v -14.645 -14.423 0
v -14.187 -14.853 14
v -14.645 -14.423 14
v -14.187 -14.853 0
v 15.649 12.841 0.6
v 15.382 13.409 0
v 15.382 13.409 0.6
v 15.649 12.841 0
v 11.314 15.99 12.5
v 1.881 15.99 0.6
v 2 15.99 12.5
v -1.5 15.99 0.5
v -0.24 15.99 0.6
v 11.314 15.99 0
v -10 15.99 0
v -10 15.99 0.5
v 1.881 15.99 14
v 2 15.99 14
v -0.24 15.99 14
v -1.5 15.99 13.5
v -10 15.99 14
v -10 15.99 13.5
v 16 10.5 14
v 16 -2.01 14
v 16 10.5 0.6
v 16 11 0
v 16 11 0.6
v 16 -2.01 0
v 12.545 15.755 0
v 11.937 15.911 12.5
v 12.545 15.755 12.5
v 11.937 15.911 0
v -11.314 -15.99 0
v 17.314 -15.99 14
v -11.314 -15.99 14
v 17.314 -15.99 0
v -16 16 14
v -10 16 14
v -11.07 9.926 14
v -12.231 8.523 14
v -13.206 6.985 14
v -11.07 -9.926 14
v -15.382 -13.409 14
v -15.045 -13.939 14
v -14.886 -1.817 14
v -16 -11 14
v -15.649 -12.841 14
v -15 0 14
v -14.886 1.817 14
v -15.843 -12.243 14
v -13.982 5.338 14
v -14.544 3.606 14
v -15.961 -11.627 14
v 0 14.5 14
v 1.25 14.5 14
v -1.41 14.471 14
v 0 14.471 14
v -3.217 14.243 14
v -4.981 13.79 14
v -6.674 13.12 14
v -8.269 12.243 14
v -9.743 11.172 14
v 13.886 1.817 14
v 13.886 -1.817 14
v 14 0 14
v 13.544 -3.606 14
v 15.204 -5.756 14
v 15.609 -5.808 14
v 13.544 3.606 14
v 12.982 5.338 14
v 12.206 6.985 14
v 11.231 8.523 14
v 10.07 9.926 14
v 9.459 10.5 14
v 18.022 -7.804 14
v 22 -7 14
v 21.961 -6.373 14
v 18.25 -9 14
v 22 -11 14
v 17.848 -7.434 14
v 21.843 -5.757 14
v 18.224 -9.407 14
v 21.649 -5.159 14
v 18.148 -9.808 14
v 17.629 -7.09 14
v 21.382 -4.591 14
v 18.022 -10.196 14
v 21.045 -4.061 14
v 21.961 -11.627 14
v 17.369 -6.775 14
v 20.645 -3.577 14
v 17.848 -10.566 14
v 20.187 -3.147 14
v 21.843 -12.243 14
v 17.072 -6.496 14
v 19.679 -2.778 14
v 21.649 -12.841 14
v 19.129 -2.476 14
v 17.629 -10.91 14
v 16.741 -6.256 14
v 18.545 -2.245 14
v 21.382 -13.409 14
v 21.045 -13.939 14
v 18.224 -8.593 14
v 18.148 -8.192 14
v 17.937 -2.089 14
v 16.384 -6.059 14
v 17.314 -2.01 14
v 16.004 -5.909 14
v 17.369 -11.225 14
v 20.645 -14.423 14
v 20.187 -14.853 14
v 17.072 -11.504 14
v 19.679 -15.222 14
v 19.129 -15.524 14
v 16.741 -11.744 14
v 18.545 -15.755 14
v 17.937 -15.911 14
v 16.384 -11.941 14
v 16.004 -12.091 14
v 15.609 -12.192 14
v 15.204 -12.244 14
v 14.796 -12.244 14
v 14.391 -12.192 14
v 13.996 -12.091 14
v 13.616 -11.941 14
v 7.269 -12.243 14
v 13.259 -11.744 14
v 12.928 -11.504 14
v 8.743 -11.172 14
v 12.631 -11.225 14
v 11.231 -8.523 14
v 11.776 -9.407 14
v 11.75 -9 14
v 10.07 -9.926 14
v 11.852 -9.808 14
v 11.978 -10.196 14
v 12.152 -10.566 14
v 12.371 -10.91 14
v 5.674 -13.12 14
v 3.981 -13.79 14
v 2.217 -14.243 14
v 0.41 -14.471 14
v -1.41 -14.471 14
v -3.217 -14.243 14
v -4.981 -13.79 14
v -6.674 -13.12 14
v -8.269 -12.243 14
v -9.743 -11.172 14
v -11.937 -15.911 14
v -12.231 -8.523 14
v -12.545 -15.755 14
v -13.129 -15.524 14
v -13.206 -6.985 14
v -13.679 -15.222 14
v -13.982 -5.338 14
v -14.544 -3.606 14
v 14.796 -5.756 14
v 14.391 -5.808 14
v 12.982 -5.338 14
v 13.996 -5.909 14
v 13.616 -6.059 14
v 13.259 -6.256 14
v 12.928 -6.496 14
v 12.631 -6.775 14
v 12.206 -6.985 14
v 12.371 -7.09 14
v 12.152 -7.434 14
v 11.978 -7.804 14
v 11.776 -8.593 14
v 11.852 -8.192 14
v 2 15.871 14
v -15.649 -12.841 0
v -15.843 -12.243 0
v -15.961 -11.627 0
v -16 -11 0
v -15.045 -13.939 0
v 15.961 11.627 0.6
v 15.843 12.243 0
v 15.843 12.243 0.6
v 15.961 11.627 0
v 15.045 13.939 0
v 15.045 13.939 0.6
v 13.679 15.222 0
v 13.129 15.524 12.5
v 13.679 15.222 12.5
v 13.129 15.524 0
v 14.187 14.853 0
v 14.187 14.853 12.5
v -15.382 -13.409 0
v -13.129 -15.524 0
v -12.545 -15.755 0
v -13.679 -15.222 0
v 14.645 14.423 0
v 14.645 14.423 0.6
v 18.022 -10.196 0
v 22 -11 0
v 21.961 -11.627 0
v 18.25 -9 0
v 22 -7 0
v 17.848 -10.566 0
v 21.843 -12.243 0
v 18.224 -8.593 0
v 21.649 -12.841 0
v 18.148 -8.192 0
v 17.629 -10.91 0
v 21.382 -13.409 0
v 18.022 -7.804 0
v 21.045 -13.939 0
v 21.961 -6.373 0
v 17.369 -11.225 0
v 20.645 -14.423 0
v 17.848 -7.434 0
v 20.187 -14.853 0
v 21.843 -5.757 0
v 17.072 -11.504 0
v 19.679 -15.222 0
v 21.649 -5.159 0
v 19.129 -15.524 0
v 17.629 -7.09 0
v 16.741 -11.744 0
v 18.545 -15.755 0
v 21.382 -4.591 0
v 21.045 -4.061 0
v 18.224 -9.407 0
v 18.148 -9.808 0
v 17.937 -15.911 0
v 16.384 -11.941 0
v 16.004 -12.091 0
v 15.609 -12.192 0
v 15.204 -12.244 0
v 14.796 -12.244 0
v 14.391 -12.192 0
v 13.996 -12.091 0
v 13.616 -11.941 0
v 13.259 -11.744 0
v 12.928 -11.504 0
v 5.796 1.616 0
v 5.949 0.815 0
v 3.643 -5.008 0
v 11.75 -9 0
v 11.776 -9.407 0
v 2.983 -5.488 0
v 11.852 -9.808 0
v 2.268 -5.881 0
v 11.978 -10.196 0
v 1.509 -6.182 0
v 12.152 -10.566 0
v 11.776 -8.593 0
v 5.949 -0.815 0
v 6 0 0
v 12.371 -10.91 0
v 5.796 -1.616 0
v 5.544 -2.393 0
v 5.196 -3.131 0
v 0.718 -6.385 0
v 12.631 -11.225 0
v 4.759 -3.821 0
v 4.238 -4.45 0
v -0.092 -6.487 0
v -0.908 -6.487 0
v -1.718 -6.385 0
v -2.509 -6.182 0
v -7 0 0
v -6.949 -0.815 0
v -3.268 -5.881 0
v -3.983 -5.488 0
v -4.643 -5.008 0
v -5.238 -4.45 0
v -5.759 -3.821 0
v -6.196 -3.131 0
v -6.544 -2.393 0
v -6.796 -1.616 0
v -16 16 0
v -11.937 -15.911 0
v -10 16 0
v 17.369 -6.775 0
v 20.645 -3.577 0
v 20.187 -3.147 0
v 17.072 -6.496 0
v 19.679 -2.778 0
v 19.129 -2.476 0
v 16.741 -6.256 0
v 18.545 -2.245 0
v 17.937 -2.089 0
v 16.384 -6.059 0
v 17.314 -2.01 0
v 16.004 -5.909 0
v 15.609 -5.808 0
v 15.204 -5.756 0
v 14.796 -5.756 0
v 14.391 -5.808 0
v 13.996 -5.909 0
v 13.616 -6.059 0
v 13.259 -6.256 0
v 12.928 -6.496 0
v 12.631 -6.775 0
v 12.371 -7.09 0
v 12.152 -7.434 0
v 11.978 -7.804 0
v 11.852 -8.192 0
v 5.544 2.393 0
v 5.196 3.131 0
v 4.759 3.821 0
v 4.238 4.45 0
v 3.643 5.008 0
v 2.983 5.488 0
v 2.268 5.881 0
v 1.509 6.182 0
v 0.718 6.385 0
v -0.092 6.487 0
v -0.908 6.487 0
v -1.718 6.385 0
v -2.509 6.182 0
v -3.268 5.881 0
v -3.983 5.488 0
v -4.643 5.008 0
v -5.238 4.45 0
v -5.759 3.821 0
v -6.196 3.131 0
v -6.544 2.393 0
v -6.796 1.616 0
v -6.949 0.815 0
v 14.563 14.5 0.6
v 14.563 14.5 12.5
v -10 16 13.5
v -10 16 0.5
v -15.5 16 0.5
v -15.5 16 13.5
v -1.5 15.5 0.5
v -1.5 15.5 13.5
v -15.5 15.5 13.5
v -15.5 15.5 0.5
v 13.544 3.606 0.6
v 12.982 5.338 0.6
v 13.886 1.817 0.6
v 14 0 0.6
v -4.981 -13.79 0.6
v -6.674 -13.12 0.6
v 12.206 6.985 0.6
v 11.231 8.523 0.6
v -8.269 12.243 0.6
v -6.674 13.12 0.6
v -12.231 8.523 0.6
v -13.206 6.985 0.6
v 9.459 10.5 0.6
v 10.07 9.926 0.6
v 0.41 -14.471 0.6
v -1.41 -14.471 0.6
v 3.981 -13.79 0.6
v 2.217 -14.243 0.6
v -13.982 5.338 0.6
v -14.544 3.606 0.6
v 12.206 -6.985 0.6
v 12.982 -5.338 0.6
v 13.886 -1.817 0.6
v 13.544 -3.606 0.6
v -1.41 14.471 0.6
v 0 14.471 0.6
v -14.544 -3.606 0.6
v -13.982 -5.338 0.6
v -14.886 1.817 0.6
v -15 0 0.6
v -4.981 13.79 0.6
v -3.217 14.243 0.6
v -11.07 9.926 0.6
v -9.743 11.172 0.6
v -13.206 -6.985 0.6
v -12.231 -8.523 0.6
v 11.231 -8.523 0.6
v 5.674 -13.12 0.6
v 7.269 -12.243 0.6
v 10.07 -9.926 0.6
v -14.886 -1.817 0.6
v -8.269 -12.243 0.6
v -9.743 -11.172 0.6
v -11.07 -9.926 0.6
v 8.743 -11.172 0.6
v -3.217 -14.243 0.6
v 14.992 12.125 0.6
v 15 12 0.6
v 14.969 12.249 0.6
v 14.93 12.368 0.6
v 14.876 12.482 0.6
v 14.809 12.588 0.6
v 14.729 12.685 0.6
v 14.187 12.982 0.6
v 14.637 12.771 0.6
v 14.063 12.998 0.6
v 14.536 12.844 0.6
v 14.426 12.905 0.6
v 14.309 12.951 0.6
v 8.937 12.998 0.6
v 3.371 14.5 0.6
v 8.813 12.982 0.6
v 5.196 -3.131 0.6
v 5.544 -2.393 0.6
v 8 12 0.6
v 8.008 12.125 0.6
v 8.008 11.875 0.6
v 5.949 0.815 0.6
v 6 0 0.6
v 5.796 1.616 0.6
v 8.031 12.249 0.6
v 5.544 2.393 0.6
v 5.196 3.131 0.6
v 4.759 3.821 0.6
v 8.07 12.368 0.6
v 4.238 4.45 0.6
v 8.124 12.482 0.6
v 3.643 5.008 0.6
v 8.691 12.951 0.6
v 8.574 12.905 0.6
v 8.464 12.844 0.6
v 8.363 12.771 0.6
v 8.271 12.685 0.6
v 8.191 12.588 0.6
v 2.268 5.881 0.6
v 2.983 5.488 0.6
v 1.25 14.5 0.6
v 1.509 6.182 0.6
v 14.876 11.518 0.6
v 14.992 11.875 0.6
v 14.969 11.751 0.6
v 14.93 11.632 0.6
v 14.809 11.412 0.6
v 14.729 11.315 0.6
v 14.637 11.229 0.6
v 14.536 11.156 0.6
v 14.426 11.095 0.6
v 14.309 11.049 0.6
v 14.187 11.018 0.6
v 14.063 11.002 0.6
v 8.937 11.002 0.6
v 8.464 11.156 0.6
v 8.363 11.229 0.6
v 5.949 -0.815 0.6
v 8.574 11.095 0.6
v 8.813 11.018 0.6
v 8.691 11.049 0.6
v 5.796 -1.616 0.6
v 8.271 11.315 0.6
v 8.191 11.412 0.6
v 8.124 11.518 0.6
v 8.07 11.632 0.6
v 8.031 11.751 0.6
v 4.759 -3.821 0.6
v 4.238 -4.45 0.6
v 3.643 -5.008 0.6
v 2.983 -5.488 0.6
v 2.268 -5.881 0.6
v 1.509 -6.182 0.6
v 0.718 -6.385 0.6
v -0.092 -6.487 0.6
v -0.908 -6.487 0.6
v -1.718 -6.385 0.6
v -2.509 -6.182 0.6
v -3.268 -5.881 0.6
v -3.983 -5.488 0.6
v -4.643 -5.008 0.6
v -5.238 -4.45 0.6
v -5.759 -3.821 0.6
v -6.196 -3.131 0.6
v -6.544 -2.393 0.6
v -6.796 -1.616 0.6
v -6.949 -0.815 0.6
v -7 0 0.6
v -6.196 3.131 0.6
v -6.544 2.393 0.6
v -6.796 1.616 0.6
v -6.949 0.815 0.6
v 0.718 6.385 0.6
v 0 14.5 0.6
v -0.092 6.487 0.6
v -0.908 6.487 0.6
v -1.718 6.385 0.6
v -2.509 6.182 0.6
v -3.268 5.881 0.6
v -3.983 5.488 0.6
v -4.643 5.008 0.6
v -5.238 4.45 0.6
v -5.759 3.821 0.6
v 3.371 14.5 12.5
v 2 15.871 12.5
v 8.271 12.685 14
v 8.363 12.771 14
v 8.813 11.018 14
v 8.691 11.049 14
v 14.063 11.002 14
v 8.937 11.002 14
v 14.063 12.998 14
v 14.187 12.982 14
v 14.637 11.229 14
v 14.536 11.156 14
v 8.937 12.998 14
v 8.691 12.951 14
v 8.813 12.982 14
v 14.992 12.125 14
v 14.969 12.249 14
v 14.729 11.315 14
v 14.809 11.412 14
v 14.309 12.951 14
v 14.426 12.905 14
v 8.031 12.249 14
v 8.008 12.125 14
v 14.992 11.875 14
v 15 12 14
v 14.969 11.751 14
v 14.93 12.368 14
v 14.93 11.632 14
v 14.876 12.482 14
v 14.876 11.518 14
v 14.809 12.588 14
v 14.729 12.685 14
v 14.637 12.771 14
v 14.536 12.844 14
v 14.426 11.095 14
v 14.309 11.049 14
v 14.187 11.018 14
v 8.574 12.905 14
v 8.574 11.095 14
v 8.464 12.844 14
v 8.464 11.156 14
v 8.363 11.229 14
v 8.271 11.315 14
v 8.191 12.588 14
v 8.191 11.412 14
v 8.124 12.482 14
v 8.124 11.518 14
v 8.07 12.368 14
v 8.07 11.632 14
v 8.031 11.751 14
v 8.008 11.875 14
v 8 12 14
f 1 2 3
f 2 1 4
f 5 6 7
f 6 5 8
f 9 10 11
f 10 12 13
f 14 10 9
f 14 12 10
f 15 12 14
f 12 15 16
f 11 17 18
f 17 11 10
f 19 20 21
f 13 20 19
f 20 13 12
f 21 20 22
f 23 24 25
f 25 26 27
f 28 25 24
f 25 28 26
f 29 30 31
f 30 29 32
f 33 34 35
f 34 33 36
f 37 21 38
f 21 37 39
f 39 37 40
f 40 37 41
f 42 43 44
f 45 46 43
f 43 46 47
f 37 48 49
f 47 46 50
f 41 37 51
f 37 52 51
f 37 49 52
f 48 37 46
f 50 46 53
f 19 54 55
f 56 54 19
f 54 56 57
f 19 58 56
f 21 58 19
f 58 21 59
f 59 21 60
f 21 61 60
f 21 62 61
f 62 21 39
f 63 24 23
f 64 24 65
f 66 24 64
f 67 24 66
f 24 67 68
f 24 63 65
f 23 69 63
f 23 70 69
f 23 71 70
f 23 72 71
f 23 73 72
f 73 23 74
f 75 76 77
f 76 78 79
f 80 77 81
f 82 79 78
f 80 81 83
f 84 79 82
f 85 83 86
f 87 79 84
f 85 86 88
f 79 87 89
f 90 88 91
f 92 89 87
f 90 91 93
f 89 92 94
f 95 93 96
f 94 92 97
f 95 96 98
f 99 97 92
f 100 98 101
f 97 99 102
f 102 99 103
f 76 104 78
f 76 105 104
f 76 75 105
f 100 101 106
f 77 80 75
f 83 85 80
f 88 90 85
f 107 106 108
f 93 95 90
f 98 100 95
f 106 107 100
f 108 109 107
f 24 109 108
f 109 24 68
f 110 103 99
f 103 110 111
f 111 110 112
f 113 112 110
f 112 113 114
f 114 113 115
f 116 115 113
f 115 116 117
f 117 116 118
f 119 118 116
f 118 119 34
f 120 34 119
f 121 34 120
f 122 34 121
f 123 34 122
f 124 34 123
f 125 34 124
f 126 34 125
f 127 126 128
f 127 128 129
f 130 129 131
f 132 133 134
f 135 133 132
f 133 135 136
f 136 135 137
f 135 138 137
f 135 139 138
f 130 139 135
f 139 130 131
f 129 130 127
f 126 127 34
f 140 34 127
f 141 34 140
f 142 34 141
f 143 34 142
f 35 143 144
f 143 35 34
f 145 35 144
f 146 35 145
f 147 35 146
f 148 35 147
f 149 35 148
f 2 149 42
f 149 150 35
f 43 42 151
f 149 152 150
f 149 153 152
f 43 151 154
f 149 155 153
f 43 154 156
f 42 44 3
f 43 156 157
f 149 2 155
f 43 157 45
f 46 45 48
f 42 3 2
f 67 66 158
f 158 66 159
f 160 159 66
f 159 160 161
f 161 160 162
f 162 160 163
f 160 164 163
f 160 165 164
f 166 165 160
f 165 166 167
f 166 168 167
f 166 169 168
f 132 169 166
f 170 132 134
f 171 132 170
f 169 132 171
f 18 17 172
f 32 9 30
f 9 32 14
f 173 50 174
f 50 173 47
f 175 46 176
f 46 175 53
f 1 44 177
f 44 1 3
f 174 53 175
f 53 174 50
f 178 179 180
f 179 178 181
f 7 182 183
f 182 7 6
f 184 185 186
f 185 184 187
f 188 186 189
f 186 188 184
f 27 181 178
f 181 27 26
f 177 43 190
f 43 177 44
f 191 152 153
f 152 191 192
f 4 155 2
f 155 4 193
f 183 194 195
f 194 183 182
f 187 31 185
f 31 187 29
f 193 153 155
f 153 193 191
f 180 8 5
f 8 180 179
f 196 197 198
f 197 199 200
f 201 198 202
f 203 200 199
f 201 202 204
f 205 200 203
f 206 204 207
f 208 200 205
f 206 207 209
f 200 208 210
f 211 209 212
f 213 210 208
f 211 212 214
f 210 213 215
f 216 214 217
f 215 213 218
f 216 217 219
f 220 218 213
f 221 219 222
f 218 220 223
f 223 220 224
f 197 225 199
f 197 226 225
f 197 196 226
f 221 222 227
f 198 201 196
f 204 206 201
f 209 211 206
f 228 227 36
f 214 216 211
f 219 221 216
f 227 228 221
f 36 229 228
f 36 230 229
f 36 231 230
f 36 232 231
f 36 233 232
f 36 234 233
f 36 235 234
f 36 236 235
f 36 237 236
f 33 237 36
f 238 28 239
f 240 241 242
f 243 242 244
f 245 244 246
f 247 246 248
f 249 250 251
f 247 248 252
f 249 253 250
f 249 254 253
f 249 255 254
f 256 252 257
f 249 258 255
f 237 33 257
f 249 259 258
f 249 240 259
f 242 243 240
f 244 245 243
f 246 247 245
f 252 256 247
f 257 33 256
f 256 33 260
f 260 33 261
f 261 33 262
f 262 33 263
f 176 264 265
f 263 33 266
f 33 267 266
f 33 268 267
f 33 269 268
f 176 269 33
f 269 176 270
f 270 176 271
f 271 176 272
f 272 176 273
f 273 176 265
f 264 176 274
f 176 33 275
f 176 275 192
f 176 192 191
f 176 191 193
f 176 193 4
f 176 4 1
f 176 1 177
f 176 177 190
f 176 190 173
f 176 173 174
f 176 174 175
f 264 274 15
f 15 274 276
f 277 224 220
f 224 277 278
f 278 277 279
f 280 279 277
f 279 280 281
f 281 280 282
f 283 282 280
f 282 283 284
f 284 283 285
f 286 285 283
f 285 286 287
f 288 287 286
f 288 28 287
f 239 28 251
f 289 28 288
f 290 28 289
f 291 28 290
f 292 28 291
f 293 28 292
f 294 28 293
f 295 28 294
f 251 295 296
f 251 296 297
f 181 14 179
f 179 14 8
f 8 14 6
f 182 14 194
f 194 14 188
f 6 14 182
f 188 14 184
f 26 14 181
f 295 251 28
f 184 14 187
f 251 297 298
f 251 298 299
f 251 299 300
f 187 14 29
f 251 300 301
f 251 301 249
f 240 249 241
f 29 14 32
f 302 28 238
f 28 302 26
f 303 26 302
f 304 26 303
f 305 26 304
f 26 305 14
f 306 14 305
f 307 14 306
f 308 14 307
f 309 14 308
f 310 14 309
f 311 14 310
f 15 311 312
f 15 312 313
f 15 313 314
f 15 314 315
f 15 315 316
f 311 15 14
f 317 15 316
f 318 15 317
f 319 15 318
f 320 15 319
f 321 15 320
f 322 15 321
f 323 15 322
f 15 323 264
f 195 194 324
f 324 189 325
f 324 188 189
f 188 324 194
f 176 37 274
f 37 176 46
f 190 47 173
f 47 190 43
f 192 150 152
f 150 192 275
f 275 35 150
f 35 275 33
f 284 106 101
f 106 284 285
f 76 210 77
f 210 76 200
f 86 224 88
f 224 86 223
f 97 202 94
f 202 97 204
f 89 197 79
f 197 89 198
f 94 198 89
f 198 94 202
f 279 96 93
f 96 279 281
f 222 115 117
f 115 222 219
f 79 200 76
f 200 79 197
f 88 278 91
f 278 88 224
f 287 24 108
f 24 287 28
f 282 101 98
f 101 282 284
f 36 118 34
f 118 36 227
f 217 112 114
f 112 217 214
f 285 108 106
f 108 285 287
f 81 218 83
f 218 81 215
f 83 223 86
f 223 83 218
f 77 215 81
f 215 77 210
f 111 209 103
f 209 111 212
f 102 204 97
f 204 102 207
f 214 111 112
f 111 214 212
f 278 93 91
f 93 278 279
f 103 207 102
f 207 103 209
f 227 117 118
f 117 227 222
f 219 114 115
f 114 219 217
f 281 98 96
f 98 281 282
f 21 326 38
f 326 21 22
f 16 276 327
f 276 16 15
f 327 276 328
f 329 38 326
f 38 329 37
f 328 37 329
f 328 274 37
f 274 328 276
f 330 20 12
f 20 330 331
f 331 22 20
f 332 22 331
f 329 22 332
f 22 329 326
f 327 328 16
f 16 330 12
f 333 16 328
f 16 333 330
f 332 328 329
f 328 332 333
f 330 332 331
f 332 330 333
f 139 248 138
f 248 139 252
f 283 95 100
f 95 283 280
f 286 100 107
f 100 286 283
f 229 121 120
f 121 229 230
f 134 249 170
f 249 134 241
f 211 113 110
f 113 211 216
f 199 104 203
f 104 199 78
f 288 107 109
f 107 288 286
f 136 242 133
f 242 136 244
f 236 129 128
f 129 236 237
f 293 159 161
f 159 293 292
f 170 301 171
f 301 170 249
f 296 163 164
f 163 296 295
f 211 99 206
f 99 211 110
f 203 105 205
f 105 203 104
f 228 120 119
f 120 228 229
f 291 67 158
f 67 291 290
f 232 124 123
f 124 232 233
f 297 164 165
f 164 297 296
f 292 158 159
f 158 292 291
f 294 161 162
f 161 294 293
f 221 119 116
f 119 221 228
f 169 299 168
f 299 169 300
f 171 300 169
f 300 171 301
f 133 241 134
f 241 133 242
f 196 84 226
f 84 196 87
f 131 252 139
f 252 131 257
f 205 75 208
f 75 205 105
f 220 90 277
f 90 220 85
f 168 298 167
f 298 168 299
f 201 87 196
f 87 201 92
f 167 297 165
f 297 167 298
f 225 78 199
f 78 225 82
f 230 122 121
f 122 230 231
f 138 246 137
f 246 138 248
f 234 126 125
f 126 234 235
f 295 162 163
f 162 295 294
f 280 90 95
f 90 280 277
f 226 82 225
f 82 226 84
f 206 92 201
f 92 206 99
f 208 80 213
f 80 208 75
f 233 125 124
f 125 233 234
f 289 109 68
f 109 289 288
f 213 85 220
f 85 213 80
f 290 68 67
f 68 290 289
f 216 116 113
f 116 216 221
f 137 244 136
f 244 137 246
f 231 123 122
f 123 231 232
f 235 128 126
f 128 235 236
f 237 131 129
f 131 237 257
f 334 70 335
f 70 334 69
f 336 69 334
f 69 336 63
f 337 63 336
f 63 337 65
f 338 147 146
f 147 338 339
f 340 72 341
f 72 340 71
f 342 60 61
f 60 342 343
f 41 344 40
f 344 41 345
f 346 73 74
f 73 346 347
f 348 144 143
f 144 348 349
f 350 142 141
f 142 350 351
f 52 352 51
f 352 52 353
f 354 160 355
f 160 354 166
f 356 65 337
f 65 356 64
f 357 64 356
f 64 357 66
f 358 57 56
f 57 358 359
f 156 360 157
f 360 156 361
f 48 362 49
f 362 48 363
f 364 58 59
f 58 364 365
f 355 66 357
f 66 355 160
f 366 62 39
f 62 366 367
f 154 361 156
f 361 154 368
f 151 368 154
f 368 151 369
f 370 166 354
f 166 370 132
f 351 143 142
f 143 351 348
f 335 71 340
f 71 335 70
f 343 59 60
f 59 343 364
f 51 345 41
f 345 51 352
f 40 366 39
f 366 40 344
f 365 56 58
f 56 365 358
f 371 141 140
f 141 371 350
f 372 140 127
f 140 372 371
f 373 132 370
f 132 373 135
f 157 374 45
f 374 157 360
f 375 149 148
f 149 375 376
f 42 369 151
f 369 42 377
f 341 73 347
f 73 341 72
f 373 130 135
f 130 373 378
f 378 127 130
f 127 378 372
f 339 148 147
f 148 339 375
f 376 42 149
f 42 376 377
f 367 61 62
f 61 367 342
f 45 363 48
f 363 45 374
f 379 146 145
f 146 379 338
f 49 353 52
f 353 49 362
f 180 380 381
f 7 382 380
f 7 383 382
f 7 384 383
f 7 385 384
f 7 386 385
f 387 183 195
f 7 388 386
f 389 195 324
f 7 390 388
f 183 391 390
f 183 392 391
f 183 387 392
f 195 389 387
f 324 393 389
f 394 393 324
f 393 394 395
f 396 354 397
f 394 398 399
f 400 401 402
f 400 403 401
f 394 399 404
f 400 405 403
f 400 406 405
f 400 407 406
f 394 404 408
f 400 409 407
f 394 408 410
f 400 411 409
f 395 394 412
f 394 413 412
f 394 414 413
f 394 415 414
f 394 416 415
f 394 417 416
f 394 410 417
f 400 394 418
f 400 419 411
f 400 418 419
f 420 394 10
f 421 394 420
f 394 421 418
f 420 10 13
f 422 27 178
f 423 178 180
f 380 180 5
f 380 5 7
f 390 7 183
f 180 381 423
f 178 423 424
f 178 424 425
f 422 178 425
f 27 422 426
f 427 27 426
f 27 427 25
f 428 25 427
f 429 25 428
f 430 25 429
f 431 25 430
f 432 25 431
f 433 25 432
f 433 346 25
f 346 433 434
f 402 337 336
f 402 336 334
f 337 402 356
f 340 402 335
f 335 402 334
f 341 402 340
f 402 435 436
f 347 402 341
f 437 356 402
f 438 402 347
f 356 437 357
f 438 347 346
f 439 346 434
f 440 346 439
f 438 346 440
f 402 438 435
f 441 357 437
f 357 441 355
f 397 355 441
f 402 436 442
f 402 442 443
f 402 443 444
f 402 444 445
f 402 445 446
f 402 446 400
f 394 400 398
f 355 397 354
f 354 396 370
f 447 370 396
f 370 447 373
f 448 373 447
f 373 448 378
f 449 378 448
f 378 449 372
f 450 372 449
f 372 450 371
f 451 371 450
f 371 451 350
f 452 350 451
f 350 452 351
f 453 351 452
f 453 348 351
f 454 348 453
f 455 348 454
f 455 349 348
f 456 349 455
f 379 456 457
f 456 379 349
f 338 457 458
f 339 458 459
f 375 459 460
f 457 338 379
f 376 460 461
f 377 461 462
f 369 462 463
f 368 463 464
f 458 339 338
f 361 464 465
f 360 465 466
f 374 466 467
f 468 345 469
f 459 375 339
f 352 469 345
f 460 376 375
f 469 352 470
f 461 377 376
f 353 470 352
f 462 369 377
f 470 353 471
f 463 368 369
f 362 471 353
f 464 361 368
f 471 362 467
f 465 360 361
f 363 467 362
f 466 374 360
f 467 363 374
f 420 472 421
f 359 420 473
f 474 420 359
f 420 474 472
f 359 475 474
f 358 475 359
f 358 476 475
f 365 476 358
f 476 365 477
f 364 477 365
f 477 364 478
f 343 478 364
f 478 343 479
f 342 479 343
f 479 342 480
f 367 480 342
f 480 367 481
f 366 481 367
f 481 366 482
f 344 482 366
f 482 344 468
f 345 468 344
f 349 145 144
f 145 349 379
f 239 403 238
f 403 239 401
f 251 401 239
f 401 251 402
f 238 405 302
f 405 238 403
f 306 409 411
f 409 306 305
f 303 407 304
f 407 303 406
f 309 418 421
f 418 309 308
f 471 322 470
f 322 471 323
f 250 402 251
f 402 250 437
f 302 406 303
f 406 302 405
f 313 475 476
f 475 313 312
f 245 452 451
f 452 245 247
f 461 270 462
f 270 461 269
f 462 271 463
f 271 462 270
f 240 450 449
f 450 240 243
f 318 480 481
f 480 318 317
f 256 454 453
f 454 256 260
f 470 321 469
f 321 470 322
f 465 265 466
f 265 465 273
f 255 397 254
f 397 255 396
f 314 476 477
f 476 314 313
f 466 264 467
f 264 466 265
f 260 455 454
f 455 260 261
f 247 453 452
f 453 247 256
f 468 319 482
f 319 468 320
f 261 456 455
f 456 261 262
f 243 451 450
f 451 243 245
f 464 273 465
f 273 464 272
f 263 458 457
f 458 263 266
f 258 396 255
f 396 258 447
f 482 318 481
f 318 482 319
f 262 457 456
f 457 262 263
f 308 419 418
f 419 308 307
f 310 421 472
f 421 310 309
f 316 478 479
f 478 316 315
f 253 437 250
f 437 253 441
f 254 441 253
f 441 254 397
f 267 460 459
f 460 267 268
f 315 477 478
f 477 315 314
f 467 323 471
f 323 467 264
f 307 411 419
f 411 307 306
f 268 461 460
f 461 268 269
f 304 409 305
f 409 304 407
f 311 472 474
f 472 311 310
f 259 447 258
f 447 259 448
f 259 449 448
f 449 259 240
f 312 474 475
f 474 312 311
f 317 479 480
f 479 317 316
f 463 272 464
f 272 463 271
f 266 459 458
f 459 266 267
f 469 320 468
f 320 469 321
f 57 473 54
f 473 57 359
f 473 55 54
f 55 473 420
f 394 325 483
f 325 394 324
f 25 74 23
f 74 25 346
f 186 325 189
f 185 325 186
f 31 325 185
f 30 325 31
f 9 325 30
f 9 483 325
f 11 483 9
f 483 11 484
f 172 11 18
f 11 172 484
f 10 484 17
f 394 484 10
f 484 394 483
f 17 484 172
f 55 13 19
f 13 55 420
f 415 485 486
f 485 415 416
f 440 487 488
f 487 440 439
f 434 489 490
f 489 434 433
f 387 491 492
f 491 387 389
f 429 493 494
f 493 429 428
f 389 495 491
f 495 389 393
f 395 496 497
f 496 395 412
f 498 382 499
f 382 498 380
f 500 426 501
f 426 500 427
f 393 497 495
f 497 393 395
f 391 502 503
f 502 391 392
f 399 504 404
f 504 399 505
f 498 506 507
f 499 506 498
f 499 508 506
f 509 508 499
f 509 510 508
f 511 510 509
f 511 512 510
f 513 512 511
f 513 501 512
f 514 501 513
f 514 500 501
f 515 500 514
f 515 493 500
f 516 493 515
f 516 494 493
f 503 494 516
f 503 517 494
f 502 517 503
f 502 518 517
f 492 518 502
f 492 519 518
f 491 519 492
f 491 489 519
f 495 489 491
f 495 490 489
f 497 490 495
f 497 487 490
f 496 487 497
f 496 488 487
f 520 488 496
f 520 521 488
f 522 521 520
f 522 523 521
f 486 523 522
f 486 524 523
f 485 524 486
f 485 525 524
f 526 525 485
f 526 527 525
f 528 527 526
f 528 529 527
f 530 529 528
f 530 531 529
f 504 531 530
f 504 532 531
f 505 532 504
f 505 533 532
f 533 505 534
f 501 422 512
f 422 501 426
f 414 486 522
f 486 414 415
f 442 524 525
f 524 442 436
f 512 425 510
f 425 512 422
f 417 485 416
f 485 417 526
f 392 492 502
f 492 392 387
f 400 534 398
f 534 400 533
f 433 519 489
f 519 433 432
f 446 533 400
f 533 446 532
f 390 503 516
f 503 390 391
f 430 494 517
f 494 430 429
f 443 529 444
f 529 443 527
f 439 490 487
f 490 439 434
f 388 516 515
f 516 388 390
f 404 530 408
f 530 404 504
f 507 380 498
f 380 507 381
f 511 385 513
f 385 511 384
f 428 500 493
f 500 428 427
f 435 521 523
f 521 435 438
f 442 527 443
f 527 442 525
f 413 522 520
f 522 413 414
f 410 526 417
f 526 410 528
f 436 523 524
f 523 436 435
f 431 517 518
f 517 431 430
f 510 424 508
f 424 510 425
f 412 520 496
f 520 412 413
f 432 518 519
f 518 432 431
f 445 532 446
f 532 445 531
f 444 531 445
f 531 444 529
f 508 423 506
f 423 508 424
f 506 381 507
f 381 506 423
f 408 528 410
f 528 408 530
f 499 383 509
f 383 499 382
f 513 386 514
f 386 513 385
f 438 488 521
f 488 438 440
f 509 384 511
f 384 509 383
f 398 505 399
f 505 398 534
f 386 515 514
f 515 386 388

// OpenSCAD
$fn = 50;


union() {
	difference() {
		union() {
			translate(v = [0, 0, 0]) {
				rotate(a = [0, 0, 0]) {
					hull() {
						translate(v = [-11.0000000000, 11.0000000000, 0]) {
							rotate(a = [0, 0, 0]) {
								translate(v = [0, 0, 0]) {
									rotate(a = [0, 0, 0]) {
										cylinder(h = 14, r = 5);
									}
								}
							}
						}
						translate(v = [11.0000000000, 11.0000000000, 0]) {
							rotate(a = [0, 0, 0]) {
								translate(v = [0, 0, 0]) {
									rotate(a = [0, 0, 0]) {
										cylinder(h = 14, r = 5);
									}
								}
							}
						}
						translate(v = [-11.0000000000, -11.0000000000, 0]) {
							rotate(a = [0, 0, 0]) {
								translate(v = [0, 0, 0]) {
									rotate(a = [0, 0, 0]) {
										cylinder(h = 14, r = 5);
									}
								}
							}
						}
						translate(v = [11.0000000000, -11.0000000000, 0]) {
							rotate(a = [0, 0, 0]) {
								translate(v = [0, 0, 0]) {
									rotate(a = [0, 0, 0]) {
										cylinder(h = 14, r = 5);
									}
								}
							}
						}
					}
				}
			}
			translate(v = [7.5000000000, -9.0000000000, 0]) {
				rotate(a = [0, 0, 0]) {
					hull() {
						translate(v = [-9.5000000000, 2.0000000000, 0]) {
							rotate(a = [0, 0, 0]) {
								translate(v = [0, 0, 0]) {
									rotate(a = [0, 0, 0]) {
										cylinder(h = 14, r = 5);
									}
								}
							}
						}
						translate(v = [9.5000000000, 2.0000000000, 0]) {
							rotate(a = [0, 0, 0]) {
								translate(v = [0, 0, 0]) {
									rotate(a = [0, 0, 0]) {
										cylinder(h = 14, r = 5);
									}
								}
							}
						}
						translate(v = [-9.5000000000, -2.0000000000, 0]) {
							rotate(a = [0, 0, 0]) {
								translate(v = [0, 0, 0]) {
									rotate(a = [0, 0, 0]) {
										cylinder(h = 14, r = 5);
									}
								}
							}
						}
						translate(v = [9.5000000000, -2.0000000000, 0]) {
							rotate(a = [0, 0, 0]) {
								translate(v = [0, 0, 0]) {
									rotate(a = [0, 0, 0]) {
										cylinder(h = 14, r = 5);
									}
								}
							}
						}
					}
				}
			}
			translate(v = [-16.0000000000, 10.0000000000, 0]) {
				rotate(a = [0, 0, 0]) {
					cube(size = [6, 6, 14]);
				}
			}
		}
		union() {
			translate(v = [-15.5000000000, 15.5000000000, 0.5000000000]) {
				rotate(a = [0, 0, 0]) {
					cube(size = [14, 0.5000000000, 13.0000000000]);
				}
			}
			translate(v = [15.0000000000, -9.0000000000, -125.0000000000]) {
				rotate(a = [0, 0, 0]) {
					cylinder(h = 250, r = 3.2500000000);
				}
			}
			translate(v = [-0.5000000000, 0.0000000000, 0.6000000000]) {
				rotate(a = [0, 0, 0]) {
					cylinder(h = 16.4000000000, r = 14.5000000000);
				}
			}
			translate(v = [-0.5000000000, 0.0000000000, -7.0000000000]) {
				rotate(a = [0, 0, 0]) {
					cylinder(h = 14, r = 6.5000000000);
				}
			}
			translate(v = [0.0000000000, 10.5000000000, 0.6000000000]) {
				rotate(a = [0, 0, 0]) {
					cube(size = [16.0000000000, 4, 16.4000000000]);
				}
			}
			translate(v = [2.0000000000, 10.5000000000, 12.5000000000]) {
				rotate(a = [0, 0, 0]) {
					cube(size = [14.0000000000, 7, 1.5000000000]);
				}
			}
			translate(v = [-3.0000000000, 18.7500000000, 0.6000000000]) {
				rotate(a = [0, 0, -45]) {
					cube(size = [10, 1.5000000000, 16.4000000000]);
				}
			}
			translate(v = [2.2500000000, 11.0000000000, 0.6000000000]) {
				rotate(a = [0, 0, 0]) {
					cube(size = [7.5000000000, 2, 13.4000000000]);
				}
			}
		}
	}
	union() {
		translate(v = [11.5000000000, 12, 0]) {
			rotate(a = [0, 0, 0]) {
				hull() {
					translate(v = [2.5000000000, 0, 0]) {
						rotate(a = [0, 0, 0]) {
							translate(v = [0, 0, 0]) {
								rotate(a = [0, 0, 0]) {
									cylinder(h = 14, r = 1.0000000000);
								}
							}
						}
					}
					translate(v = [-2.5000000000, 0, 0]) {
						rotate(a = [0, 0, 0]) {
							translate(v = [0, 0, 0]) {
								rotate(a = [0, 0, 0]) {
									cylinder(h = 14, r = 1.0000000000);
								}
							}
						}
					}
				}
			}
		}
	}
}
